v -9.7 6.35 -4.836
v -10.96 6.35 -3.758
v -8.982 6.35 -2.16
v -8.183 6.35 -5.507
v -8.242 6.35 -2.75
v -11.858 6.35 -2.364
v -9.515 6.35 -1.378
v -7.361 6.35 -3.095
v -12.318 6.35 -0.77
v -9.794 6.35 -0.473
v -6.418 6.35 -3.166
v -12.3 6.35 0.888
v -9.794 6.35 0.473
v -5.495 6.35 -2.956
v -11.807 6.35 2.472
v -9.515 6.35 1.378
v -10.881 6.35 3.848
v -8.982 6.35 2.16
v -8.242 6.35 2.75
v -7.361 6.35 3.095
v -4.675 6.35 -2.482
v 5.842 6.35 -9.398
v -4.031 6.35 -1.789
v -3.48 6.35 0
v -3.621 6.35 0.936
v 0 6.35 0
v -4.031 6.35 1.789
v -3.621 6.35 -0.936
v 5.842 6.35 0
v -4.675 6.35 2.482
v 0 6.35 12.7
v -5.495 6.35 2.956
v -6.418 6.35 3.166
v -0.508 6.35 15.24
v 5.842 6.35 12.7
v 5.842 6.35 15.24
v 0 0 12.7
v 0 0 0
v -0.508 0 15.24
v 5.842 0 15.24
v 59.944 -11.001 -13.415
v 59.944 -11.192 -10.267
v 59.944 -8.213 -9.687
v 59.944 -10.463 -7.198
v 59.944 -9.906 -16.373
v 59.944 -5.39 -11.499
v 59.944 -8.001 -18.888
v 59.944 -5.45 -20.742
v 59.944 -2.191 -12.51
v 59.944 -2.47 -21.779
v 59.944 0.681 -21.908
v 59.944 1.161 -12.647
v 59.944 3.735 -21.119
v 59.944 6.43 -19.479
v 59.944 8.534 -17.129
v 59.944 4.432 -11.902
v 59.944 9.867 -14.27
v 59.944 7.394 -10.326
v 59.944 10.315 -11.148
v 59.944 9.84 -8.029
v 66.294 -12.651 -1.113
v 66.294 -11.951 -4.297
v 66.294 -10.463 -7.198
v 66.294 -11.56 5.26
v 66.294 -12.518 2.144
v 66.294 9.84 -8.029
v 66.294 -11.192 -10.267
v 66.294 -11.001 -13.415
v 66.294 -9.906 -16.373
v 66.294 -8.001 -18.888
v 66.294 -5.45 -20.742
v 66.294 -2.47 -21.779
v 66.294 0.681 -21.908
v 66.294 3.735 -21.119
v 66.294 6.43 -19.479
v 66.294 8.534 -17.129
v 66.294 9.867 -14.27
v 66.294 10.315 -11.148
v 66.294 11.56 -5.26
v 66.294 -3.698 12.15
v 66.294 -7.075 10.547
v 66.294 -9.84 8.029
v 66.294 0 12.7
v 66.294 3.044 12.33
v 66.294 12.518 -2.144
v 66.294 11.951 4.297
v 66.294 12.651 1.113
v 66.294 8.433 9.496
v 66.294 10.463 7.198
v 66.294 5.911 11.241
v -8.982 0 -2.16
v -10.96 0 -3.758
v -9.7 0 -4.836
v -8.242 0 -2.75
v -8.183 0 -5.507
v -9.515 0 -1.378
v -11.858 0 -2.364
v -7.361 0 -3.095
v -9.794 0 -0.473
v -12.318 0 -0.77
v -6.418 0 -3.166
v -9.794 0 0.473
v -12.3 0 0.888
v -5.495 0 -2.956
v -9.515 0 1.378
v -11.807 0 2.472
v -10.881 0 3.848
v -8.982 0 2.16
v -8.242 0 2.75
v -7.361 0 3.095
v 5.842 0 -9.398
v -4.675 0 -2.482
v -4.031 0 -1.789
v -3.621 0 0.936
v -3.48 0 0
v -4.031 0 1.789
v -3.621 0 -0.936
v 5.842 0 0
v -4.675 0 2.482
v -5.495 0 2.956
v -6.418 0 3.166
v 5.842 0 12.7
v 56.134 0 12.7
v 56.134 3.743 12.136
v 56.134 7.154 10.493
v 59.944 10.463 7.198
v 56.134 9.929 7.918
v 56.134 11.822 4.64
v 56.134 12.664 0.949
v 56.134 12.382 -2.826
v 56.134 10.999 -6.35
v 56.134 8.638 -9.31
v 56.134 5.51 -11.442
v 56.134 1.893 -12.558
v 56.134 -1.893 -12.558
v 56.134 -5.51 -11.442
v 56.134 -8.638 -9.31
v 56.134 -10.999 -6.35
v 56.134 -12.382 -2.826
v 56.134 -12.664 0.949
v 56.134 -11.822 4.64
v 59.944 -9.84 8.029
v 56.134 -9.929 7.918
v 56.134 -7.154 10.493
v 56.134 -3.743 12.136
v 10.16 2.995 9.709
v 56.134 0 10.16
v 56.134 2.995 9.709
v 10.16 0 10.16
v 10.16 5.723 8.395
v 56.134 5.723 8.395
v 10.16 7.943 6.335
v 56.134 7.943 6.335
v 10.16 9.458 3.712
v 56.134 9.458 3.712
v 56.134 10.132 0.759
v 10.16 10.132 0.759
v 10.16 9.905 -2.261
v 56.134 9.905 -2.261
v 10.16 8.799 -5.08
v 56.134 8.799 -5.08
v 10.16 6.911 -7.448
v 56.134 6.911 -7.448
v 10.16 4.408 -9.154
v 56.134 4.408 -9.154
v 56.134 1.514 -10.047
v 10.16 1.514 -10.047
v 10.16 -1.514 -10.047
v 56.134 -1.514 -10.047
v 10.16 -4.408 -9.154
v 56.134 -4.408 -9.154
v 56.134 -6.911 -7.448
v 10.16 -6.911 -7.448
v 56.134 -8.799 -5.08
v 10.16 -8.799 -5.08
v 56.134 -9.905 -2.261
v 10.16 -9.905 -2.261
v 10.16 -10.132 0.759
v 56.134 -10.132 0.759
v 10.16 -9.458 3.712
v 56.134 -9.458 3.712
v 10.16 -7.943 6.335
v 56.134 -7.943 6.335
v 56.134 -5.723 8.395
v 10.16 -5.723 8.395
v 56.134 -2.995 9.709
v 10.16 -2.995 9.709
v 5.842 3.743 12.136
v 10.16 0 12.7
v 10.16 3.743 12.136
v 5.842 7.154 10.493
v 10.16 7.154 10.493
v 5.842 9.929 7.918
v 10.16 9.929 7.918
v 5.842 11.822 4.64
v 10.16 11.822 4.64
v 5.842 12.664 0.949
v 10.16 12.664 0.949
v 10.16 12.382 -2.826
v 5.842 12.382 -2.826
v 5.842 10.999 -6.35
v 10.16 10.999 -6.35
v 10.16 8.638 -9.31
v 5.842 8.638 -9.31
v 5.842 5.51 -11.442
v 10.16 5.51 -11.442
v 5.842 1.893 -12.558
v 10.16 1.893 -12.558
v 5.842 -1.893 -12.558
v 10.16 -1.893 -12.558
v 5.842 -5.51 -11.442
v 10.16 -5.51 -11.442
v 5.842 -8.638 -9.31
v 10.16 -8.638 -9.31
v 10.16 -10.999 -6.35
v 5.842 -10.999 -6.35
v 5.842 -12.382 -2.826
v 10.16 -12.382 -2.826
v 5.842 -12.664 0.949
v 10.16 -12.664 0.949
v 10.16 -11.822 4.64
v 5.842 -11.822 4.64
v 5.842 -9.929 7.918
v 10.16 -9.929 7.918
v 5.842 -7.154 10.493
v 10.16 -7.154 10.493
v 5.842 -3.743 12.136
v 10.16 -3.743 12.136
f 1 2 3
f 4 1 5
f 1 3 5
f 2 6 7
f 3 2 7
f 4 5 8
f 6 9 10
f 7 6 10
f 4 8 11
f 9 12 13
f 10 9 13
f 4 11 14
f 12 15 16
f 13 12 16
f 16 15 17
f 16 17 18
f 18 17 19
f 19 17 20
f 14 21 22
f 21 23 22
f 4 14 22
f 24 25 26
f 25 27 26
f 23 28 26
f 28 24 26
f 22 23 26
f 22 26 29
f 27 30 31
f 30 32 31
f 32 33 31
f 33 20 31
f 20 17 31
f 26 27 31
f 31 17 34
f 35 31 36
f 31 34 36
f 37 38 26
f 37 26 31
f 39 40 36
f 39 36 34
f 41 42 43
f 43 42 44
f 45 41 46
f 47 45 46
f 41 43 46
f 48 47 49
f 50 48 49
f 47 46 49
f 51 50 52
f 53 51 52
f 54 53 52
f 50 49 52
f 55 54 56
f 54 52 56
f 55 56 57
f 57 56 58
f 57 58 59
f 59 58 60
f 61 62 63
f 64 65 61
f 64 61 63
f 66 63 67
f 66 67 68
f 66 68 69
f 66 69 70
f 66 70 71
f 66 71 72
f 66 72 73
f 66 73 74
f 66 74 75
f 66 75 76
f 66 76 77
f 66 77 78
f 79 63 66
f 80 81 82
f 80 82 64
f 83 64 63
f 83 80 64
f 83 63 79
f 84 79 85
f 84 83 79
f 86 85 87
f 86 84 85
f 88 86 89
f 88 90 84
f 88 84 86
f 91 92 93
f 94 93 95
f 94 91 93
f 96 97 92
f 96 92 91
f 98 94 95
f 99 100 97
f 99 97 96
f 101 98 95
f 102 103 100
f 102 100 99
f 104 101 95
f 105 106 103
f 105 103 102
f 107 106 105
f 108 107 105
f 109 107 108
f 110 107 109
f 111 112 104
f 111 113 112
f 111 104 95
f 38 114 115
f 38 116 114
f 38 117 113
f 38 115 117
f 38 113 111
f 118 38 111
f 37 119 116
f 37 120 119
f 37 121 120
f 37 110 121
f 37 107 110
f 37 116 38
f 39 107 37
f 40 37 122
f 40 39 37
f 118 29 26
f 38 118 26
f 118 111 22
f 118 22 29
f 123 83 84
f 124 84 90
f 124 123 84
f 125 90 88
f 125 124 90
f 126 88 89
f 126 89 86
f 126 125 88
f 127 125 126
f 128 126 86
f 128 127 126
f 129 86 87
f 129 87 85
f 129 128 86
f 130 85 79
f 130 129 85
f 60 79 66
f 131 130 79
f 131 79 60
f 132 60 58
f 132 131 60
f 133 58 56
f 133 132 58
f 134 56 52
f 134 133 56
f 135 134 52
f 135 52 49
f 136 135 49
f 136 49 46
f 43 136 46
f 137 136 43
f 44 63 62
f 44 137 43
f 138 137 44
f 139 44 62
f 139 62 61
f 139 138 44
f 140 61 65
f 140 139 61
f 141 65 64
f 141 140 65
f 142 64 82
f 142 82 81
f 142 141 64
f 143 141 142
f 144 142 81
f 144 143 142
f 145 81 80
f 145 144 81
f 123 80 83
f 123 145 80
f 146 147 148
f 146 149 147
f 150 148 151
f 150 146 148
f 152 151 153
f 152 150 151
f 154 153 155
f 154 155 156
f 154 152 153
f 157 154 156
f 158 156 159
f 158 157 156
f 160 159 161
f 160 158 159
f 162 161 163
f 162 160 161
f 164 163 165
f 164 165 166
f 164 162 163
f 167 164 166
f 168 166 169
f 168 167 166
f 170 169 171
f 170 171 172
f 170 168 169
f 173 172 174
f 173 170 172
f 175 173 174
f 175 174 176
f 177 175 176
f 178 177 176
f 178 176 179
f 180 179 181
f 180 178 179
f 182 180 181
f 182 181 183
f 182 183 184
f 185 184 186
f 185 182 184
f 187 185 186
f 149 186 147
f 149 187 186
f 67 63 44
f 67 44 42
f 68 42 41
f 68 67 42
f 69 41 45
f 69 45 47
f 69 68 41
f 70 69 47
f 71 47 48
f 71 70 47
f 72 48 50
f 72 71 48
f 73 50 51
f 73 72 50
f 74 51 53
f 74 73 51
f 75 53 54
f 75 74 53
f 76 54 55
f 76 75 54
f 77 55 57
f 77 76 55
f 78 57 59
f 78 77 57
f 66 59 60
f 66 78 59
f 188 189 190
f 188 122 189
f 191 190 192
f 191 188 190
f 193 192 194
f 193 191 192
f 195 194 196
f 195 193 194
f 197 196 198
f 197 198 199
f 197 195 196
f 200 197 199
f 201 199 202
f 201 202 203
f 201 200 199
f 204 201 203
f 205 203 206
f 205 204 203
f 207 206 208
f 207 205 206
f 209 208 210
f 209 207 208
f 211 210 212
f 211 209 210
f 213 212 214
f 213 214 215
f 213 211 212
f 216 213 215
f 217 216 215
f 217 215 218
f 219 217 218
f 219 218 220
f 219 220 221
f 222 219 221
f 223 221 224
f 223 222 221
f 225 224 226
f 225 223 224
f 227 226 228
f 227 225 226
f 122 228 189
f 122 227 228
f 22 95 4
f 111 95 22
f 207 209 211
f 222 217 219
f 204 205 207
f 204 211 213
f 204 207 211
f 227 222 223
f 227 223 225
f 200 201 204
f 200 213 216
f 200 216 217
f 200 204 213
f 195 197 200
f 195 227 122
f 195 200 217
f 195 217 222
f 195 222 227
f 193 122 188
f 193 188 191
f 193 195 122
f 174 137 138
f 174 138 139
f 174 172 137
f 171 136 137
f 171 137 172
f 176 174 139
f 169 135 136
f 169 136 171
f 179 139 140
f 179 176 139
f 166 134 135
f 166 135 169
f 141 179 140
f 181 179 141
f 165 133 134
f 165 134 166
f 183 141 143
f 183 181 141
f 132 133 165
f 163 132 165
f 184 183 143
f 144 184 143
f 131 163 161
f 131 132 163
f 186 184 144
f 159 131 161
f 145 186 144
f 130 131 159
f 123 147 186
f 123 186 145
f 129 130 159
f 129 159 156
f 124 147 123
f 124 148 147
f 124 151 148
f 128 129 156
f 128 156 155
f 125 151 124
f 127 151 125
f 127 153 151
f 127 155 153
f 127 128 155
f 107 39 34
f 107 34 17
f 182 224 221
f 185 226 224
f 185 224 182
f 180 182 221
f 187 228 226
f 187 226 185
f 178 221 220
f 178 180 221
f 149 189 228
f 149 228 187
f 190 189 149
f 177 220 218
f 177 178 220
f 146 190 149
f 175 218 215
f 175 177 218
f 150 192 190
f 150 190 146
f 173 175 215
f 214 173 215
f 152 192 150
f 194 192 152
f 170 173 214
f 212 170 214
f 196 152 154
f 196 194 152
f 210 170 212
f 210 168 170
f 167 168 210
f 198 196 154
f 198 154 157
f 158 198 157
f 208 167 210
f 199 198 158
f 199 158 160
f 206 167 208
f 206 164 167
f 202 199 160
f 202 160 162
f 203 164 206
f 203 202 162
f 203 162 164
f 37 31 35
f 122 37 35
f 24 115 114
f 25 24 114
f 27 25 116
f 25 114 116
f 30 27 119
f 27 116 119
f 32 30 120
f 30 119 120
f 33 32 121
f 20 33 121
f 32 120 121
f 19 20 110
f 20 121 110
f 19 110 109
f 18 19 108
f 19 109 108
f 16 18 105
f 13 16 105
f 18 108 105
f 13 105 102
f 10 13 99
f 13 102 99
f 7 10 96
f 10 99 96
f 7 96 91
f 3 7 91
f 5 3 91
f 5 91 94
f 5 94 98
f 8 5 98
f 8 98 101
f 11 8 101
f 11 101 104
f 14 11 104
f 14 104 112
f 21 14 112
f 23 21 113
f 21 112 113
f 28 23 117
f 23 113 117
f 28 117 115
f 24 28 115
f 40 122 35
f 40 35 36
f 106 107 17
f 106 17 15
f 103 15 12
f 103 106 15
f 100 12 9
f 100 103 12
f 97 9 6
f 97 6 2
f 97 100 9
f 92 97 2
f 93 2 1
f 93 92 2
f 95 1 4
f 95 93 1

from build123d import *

# Parameters (mm, degrees)
F0_R     = 3.175
F1_DEPTH = 6.35
F5_DEPTH = 6.35


# Not quite as in the source:
# - a feature of the source that left no trace in its solid (it failed there, or was rolled back) is left out


with BuildPart() as f1:
    # F0 (on Front) → F1 (new body)
    with BuildSketch(Plane.XZ):
        with BuildLine():
            Line((-0.9398, 0), (0, 0))
            Line((0, 0), (0, 12.7))
            Line((0, 12.7), (5.842, 12.7))
            Line((5.842, 12.7), (5.842, 15.24))
            Line((5.842, 15.24), (-0.508, 15.24))
            Line((-0.508, 15.24), (-10.8806298187, 3.8475430269))
            ThreePointArc((-10.8806298187, 3.8475430269), (-4.5919612295, 5.3297205562), (-0.9398, 0))
        make_face()
        with BuildLine():
            ThreePointArc((-8.1826630726, -5.5069827884), (-3.1957909266, -4.5493385486), (-0.9398, 0))
            ThreePointArc((-0.9398, 0), (-4.5919612295, 5.3297205562), (-10.8806298187, 3.8475430269))
            ThreePointArc((-10.8806298187, 3.8475430269), (-12.1459778134, -1.5837270034), (-8.1826630726, -5.5069827884))
        make_face()
        with Locations((-6.6548, 0)):
            Circle(F0_R, mode=Mode.SUBTRACT)
        with BuildLine():
            Line((5.842, 0), (0, 0))
            Line((0, 0), (-0.9398, 0))
            ThreePointArc((-0.9398, 0), (-3.1957909266, -4.5493385486), (-8.1826630726, -5.5069827884))
            Line((-8.1826630726, -5.5069827884), (5.842, -9.398))
            Line((5.842, -9.398), (5.842, 0))
        make_face()
    extrude(amount=-F1_DEPTH)


with BuildPart() as f3:
    # F0 (on Front) → F3 (revolve)
    with BuildSketch(Plane.XZ):
        Polygon((5.842, 12.7), (5.842, 0), (66.294, 0), (66.294, 12.7), (56.134, 12.7), (56.134, 10.16), (10.16, 10.16), (10.16, 12.7), align=None)
    revolve(axis=Axis((33.147, 0, 0), (-1, 0, 0)))

    # F4 (on face) → F5 (join)
    with BuildSketch(Plane.YZ.offset(66.294)):
        with BuildLine():
            ThreePointArc((9.8396858807, -8.0293574942), (-0.5196744669, -12.6893632011), (-10.463295241, -7.1978783471))
            ThreePointArc((-10.463295241, -7.1978783471), (-0.8993069074, -21.9591931184), (9.8396858807, -8.0293574942))
        make_face()
        with BuildLine():
            Line((-9.8396858807, 8.0293574942), (-10.463295241, -7.1978783471))
            ThreePointArc((-10.463295241, -7.1978783471), (-0.5196744669, -12.6893632011), (9.8396858807, -8.0293574942))
            Line((9.8396858807, -8.0293574942), (10.463295241, 7.1978783471))
            Line((10.463295241, 7.1978783471), (-9.8396858807, 8.0293574942))
        make_face()
    extrude(amount=-F5_DEPTH)


solid = Compound([f1.part, f3.part])
